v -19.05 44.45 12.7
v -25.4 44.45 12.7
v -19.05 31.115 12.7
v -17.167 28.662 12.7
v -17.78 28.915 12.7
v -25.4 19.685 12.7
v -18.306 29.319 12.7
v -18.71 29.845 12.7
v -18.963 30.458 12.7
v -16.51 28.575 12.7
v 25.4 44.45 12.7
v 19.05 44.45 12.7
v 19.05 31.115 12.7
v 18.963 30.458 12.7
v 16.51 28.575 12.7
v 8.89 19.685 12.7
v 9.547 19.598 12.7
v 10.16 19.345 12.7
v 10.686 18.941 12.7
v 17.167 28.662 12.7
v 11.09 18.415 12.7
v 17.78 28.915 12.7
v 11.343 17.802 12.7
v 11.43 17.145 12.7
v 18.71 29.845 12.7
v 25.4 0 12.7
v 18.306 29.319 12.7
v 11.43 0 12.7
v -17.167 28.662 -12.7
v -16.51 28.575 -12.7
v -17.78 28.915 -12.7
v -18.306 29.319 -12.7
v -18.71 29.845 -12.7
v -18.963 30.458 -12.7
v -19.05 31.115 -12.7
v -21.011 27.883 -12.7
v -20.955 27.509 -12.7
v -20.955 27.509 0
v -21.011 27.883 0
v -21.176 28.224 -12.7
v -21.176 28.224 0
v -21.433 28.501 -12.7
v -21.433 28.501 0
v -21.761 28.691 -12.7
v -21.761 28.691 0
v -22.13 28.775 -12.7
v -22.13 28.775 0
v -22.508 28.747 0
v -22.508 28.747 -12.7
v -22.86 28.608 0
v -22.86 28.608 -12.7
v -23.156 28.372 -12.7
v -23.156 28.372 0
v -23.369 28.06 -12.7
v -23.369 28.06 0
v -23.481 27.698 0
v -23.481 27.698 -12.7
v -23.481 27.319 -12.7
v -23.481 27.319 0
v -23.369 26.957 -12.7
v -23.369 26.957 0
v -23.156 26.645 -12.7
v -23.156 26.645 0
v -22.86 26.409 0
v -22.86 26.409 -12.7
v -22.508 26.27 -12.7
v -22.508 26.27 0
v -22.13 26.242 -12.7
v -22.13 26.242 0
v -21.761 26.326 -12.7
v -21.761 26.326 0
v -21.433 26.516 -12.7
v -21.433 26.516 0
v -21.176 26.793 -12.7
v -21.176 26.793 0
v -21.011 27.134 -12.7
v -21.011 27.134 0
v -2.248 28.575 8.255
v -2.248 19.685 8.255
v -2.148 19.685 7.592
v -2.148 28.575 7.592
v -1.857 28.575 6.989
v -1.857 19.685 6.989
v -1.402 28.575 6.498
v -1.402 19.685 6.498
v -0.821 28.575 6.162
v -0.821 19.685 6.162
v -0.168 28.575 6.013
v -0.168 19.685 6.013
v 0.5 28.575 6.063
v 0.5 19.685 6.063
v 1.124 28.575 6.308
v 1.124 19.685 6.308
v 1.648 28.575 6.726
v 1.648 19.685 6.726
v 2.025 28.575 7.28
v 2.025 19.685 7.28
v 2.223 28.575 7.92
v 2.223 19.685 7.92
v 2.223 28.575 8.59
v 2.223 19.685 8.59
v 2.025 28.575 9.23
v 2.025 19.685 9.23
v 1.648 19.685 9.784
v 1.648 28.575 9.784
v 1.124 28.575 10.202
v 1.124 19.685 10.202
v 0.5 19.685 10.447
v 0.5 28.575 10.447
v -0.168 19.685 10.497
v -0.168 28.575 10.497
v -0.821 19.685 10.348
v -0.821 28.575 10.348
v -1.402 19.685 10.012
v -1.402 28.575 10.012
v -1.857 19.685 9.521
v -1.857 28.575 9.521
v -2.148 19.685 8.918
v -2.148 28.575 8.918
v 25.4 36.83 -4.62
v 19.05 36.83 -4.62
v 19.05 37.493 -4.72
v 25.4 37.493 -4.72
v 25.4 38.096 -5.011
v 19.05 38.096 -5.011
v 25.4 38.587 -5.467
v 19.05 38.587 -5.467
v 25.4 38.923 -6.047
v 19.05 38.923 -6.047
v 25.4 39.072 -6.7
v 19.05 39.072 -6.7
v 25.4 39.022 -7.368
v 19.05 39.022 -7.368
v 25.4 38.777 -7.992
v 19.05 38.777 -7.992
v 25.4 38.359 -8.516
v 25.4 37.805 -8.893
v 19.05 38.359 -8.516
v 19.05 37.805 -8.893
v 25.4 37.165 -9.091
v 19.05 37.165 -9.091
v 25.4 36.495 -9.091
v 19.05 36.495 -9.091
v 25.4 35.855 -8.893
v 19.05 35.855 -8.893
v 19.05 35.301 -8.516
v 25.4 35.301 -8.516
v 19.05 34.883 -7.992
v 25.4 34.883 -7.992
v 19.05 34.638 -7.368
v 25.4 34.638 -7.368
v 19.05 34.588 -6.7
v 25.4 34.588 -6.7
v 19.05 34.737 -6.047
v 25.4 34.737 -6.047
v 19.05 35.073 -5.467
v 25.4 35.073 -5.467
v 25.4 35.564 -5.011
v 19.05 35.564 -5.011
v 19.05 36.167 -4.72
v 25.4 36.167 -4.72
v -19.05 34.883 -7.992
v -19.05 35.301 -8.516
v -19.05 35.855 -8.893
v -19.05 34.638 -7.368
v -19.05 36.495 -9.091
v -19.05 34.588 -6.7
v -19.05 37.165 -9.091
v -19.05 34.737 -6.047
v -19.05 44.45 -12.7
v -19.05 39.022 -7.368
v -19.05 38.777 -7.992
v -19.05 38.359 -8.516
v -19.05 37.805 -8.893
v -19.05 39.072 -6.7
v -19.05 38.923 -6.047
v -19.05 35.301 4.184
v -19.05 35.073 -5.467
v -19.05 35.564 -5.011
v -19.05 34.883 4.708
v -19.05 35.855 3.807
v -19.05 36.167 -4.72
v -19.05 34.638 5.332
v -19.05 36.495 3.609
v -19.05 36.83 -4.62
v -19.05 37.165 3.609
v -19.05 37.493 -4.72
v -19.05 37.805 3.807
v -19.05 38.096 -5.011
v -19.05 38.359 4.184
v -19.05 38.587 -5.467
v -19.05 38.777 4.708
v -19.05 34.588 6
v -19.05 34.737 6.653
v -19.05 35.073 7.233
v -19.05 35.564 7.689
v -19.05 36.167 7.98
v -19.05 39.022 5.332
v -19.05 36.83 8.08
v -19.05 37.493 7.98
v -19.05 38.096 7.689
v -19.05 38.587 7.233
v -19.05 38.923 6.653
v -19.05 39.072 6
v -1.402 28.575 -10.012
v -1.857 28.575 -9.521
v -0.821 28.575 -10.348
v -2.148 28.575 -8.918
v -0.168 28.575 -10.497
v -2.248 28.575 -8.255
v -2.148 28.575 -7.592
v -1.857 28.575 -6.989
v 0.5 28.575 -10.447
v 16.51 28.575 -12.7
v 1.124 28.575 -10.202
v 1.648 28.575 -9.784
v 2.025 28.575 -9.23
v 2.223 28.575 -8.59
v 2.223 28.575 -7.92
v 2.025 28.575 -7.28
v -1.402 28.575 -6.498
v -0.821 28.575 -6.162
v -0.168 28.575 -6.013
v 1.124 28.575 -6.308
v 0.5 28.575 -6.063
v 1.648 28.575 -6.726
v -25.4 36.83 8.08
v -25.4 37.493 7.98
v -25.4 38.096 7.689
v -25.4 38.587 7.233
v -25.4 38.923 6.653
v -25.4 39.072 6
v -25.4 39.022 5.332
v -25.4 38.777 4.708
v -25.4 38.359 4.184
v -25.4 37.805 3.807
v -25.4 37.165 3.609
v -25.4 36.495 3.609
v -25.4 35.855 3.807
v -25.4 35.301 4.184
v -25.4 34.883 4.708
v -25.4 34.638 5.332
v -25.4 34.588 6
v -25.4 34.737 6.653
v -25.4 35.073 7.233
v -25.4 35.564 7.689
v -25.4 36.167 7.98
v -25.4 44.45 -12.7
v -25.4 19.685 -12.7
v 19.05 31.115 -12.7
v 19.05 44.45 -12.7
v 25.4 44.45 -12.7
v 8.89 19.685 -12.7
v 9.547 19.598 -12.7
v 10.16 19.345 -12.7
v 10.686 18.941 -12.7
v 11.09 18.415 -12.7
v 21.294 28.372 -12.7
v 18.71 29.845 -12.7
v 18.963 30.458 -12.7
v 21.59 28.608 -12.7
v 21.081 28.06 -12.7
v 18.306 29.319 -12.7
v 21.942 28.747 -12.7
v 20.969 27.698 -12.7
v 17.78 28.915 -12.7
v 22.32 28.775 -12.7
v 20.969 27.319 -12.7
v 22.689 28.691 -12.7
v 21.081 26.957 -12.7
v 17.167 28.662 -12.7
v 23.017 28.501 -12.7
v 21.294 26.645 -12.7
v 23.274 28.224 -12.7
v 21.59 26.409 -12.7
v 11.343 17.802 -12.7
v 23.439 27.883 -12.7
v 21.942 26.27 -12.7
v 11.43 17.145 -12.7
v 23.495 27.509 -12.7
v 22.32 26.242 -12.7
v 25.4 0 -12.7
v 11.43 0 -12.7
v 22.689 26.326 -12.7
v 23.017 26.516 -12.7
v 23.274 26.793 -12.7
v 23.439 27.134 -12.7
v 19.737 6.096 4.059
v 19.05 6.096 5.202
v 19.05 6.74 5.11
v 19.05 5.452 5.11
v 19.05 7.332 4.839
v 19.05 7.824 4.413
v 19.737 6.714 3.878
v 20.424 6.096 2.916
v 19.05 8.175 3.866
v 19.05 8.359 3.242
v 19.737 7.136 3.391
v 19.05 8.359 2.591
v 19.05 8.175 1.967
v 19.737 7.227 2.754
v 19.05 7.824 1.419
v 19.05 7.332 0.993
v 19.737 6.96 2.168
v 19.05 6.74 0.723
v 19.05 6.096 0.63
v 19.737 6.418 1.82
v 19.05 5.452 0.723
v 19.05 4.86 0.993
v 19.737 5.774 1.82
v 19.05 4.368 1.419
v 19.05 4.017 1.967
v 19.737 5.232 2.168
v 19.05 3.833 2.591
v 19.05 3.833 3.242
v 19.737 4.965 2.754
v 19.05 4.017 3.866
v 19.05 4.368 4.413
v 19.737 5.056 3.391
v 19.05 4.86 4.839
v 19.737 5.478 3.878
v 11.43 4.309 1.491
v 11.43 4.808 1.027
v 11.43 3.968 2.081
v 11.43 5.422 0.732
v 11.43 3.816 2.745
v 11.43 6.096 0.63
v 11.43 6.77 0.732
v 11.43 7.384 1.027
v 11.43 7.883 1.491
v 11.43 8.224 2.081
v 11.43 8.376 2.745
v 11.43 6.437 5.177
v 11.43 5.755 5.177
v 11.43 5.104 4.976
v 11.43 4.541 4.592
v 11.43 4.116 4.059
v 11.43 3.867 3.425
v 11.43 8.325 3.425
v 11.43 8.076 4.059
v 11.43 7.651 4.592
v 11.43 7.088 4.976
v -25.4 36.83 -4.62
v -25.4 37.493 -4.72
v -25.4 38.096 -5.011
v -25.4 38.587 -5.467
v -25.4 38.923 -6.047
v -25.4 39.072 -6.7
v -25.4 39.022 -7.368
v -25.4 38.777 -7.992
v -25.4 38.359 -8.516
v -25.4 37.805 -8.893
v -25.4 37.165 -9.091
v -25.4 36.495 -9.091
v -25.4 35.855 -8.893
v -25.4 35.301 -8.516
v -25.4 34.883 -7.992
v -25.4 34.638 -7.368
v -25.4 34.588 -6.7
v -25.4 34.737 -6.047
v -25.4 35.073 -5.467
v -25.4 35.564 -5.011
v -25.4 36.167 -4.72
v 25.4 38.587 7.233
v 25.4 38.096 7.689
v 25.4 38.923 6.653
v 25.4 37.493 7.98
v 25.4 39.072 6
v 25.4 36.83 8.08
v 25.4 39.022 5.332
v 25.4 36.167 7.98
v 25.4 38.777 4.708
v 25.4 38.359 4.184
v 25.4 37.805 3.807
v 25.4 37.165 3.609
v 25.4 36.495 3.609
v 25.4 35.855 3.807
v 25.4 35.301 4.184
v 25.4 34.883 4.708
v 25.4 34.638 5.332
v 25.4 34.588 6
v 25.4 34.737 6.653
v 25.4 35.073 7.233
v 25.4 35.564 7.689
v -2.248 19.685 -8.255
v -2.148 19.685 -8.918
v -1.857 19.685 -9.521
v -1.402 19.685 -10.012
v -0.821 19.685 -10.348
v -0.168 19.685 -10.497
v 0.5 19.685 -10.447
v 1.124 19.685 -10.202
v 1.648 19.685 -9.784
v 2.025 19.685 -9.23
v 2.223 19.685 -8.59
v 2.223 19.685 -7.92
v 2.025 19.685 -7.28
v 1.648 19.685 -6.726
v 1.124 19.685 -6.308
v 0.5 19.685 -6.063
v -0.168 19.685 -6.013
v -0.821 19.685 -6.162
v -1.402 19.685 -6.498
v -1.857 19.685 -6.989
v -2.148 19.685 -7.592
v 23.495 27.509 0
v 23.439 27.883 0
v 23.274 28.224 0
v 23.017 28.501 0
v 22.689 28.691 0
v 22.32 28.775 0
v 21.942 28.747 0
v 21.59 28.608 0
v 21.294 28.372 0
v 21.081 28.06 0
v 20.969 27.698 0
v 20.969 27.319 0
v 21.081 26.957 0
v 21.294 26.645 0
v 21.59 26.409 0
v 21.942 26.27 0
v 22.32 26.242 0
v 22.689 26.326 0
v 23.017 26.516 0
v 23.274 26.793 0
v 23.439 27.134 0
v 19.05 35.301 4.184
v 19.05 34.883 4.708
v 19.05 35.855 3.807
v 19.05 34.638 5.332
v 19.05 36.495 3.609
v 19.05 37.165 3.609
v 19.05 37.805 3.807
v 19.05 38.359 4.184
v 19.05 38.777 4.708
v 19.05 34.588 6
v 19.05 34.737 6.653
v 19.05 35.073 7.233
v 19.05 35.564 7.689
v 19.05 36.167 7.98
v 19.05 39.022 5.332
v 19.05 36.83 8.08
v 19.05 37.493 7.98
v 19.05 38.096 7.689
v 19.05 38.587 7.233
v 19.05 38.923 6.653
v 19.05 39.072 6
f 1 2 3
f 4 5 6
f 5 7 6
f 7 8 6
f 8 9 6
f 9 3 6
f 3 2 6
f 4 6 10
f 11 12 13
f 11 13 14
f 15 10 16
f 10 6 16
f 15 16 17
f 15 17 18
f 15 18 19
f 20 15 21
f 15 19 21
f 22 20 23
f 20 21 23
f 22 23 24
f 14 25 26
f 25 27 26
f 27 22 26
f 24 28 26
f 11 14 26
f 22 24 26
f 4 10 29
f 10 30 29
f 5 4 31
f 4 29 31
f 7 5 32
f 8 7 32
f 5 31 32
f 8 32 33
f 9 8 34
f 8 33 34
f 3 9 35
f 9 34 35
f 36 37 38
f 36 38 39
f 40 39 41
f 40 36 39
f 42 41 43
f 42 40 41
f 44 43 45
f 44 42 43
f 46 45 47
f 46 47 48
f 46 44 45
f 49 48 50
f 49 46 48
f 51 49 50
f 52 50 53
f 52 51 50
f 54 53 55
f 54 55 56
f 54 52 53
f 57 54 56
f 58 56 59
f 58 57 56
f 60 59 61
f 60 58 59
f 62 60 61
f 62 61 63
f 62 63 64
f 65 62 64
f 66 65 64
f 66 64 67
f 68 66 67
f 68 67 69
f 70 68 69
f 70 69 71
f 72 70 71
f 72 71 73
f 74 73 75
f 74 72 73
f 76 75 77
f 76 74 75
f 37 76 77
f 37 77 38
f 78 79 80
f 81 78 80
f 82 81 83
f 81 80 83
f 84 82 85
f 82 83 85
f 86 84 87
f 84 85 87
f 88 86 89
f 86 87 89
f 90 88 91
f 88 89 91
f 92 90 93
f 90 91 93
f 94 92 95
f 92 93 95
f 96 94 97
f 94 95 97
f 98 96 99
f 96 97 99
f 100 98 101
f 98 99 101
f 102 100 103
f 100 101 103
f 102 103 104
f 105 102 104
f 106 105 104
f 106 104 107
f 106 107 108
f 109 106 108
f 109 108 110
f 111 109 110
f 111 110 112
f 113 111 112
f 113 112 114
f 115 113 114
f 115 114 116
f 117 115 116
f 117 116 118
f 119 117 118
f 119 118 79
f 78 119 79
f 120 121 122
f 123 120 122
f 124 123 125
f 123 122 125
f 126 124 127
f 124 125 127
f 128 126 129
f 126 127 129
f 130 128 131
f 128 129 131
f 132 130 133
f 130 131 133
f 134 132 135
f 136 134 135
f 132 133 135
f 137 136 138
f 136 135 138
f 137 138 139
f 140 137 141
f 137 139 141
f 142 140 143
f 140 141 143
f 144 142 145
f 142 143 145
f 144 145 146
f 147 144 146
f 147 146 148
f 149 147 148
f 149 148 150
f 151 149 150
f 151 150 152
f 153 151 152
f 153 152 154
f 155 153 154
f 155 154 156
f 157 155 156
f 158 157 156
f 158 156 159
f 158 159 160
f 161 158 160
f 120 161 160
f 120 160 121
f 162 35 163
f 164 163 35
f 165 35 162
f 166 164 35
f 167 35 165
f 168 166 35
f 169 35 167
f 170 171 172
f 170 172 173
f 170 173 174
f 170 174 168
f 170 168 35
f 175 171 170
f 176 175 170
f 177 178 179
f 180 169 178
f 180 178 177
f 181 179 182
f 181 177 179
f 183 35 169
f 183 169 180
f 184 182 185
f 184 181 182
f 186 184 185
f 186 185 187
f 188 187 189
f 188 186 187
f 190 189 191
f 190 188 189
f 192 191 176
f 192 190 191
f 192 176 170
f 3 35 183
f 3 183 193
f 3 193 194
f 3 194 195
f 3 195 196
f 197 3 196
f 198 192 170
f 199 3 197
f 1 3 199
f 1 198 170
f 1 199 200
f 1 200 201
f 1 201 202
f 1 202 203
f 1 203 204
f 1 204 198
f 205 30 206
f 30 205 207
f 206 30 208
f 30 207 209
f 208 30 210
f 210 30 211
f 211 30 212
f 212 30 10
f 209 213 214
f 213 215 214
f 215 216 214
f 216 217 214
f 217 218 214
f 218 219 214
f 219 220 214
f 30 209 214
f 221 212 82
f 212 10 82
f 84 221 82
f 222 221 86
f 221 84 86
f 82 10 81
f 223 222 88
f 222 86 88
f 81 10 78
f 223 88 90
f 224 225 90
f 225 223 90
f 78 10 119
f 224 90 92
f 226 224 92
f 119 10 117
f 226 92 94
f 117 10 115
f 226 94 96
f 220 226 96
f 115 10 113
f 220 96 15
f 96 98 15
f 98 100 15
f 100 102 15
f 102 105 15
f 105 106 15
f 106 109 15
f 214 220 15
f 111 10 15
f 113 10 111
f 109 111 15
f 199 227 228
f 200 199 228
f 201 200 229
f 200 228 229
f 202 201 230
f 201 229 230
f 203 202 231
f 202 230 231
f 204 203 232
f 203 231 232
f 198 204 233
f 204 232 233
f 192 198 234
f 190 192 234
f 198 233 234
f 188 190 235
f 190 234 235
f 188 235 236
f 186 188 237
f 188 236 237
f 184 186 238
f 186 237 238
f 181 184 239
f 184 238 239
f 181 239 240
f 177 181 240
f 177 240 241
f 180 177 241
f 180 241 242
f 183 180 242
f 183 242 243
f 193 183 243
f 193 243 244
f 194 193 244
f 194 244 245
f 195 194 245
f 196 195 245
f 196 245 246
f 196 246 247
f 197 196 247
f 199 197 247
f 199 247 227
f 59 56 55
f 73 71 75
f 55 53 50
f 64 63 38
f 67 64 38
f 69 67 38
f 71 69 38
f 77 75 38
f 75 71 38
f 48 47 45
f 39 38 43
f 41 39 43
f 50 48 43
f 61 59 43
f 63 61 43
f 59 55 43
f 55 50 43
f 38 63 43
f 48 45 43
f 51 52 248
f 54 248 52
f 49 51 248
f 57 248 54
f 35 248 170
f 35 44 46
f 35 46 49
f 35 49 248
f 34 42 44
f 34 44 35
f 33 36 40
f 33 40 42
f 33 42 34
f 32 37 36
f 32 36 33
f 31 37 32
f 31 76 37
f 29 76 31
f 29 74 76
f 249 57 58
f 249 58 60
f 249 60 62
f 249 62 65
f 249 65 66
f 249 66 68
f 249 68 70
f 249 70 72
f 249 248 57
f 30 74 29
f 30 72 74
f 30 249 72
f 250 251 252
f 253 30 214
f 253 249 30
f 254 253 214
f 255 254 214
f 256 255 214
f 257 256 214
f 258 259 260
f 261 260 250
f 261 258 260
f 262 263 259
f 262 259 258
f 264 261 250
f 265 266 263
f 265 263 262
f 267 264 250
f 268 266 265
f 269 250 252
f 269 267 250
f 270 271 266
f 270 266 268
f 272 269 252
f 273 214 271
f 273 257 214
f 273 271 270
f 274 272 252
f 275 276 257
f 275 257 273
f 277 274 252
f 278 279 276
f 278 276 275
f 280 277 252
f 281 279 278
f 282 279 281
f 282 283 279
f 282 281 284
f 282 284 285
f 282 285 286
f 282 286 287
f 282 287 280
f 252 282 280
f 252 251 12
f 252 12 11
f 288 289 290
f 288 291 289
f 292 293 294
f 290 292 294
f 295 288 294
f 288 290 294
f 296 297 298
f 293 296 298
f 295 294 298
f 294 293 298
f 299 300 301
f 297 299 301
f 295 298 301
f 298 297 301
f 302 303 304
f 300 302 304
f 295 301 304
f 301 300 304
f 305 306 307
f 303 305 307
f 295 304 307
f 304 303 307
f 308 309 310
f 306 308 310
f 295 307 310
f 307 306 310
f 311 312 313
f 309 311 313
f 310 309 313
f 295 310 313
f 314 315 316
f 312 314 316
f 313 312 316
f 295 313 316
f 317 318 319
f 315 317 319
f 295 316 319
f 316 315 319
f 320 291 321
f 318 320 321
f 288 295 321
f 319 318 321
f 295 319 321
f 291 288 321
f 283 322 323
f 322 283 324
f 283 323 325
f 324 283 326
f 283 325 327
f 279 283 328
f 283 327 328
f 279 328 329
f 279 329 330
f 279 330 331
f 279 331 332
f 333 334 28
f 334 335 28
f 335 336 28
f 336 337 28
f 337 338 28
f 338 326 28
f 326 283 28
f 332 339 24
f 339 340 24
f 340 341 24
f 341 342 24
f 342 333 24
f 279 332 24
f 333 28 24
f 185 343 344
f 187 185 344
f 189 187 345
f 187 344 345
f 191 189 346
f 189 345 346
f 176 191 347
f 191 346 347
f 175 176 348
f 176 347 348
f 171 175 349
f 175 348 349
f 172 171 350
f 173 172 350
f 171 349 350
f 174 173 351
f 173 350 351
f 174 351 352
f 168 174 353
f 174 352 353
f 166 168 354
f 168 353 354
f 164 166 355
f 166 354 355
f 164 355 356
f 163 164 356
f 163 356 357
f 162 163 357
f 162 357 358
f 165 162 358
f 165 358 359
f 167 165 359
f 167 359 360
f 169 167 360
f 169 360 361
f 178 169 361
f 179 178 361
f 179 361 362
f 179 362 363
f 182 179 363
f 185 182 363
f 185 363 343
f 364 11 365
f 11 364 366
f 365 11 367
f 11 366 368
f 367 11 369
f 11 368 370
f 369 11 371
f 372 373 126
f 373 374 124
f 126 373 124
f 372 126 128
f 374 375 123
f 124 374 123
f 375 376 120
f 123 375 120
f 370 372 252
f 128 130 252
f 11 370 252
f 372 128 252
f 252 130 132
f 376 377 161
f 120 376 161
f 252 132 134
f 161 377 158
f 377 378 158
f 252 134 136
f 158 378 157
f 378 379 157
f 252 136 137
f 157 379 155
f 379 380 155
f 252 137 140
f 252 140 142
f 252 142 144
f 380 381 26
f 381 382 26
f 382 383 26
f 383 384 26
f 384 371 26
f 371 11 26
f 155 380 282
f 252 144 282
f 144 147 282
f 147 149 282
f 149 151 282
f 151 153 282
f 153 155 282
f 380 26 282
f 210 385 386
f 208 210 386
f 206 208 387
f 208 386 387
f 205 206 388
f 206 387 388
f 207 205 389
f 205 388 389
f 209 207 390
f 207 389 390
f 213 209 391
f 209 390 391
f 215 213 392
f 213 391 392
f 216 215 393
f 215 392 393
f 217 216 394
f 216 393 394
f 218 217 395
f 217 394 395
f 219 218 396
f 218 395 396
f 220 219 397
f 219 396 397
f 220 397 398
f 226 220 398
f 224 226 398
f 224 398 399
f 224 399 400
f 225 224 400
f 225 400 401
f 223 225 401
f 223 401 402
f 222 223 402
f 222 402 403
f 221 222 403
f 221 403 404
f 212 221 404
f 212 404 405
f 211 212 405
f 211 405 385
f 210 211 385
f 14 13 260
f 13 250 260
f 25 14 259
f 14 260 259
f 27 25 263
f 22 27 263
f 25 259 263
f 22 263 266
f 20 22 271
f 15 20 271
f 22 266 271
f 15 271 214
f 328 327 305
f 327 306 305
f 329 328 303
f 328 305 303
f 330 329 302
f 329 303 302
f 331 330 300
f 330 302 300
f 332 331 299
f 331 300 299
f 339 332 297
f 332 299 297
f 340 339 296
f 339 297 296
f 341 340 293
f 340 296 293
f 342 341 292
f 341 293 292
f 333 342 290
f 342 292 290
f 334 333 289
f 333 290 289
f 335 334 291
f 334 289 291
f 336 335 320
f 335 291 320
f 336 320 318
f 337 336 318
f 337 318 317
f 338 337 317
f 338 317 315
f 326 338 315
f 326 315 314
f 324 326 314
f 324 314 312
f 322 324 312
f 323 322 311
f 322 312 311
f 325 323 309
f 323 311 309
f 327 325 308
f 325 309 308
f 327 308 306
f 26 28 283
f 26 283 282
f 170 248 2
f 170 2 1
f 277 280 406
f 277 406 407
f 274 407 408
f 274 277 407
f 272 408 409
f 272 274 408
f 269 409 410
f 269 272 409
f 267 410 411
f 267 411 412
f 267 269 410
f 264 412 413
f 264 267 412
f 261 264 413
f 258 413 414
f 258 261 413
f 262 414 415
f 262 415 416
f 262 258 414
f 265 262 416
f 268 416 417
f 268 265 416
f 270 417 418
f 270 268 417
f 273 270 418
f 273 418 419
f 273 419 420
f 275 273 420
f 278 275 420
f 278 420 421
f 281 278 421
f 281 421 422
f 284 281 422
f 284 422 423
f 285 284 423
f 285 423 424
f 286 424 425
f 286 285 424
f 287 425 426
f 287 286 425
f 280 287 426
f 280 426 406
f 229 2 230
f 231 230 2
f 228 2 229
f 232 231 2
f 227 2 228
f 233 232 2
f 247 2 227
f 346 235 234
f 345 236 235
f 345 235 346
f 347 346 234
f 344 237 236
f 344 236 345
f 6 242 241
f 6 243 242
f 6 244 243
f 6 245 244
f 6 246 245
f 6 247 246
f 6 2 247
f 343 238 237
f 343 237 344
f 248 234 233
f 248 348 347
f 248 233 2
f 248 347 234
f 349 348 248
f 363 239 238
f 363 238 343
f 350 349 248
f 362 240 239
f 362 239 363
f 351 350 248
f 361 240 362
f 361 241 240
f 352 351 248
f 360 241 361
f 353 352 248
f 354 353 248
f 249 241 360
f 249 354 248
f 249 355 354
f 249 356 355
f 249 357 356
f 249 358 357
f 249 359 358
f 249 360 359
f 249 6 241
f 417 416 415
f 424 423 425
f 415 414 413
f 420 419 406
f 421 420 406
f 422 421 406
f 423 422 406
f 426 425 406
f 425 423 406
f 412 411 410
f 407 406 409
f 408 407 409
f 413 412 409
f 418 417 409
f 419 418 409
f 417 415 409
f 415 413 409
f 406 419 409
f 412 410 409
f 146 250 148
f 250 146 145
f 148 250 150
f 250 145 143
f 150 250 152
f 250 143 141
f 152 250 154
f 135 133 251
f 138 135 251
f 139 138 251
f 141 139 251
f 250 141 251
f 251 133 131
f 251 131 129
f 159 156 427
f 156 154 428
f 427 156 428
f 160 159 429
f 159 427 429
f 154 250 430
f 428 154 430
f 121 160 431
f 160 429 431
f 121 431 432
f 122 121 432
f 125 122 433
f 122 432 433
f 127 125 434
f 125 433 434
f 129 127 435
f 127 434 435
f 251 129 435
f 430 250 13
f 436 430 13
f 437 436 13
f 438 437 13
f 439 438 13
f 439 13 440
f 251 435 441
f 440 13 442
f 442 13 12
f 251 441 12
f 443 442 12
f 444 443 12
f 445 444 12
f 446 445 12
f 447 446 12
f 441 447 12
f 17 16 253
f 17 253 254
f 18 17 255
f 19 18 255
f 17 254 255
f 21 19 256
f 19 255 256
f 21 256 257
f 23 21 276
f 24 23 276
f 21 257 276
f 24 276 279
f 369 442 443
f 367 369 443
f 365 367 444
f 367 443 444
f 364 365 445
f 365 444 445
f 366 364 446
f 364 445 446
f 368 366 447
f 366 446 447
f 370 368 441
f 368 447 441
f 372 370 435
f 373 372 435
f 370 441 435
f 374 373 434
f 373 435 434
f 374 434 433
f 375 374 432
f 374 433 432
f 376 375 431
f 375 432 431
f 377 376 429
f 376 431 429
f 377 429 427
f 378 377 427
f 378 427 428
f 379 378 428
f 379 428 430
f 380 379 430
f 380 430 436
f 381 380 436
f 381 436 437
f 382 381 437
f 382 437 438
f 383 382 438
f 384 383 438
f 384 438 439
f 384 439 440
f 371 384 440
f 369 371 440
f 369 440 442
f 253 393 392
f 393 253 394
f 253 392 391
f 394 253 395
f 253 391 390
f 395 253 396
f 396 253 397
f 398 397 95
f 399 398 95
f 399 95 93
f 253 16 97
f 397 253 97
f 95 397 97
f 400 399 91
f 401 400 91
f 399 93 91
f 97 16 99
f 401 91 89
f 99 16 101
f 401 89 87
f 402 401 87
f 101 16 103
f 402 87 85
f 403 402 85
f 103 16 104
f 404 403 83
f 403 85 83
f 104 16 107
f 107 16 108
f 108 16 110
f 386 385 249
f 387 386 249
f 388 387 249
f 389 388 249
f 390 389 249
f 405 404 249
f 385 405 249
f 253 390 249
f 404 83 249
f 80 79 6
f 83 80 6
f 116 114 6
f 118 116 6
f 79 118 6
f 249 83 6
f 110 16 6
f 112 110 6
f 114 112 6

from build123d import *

# Parameters (mm, degrees)
SKETCH1_W                    = 50.8
SKETCH1_H                    = 25.4
BOSS_EXTRUDE1_DEPTH          = 44.45
SKETCH8_W                    = 13.97
SKETCH8_H                    = 19.685
SKETCH8_W_2                  = 22.86
SKETCH8_W_3                  = 38.1
SKETCH8_H_2                  = 15.875
CUT_EXTRUDE1_DEPTH           = 58.15
F_8_CLEARANCE_HOLE3_D        = 4.4958
F_8_CLEARANCE_HOLE2_D        = 4.4958
F_1_8_0_18_DOWEL_HOLE1_D     = 4.572
F_1_8_0_18_DOWEL_HOLE1_DEPTH = 7.62
F_1_8_0_18_DOWEL_HOLE1_TIP   = 1.373567375
FILLET1_R                    = 2.54
SKETCH17_R                   = 1.27
CUT_EXTRUDE3_DEPTH           = 12.7


with BuildPart() as part:
    # Sketch1 → Boss-Extrude1 (new body)
    with BuildSketch(Plane(origin=(0, 0, 0), x_dir=(1, 0, 0), z_dir=(0, 1, 0))):
        Rectangle(SKETCH1_W, SKETCH1_H)
    extrude(amount=BOSS_EXTRUDE1_DEPTH)

    # Sketch8 → Cut-Extrude1 (cut, through all)
    with BuildSketch(Plane.XY.offset(12.7)):
        with Locations((-18.415, 9.8425)):
            Rectangle(SKETCH8_W, SKETCH8_H)
        with Locations((0, 9.8425)):
            Rectangle(SKETCH8_W_2, SKETCH8_H)
        with Locations((0, 36.5125)):
            Rectangle(SKETCH8_W_3, SKETCH8_H_2)
    extrude(amount=-CUT_EXTRUDE1_DEPTH, mode=Mode.SUBTRACT)

    # #8 Clearance Hole3 (through all)
    with Locations(Plane(origin=(25.4, 0, 0), x_dir=(0, 0, -1), z_dir=(1, 0, 0))):
        with Locations((6.868185943, 36.83), (-5.831814057, 36.83)):
            Hole(F_8_CLEARANCE_HOLE3_D / 2)

    # #8 Clearance Hole2 (through all)
    with Locations(Plane(origin=(0, 28.575, 0), x_dir=(1, 0, 0), z_dir=(0, 1, 0))):
        with Locations((0, 8.255), (0, -8.255)):
            Hole(F_8_CLEARANCE_HOLE2_D / 2)

    # 1/8 (0.18) Dowel Hole1
    with Locations(Plane.ZY.offset(-11.43)):
        with Locations((2.916276039, 6.096)):
            Hole(F_1_8_0_18_DOWEL_HOLE1_D / 2, depth=F_1_8_0_18_DOWEL_HOLE1_DEPTH)
            with Locations((0, 0, -(F_1_8_0_18_DOWEL_HOLE1_DEPTH + F_1_8_0_18_DOWEL_HOLE1_TIP / 2))):  # 118° drill point
                Cone(0, F_1_8_0_18_DOWEL_HOLE1_D / 2, F_1_8_0_18_DOWEL_HOLE1_TIP, mode=Mode.SUBTRACT)

    # Fillet1
    fillet1_edges = [part.edges().sort_by_distance(p)[0] for p in [
        (11.43, 19.685, 0),
        (19.05, 28.575, 0),
        (-19.05, 28.575, 0),
    ]]
    fillet(fillet1_edges, radius=FILLET1_R)

    # Sketch17 → Cut-Extrude3 (cut)
    with BuildSketch(Plane.XY.offset(-12.7)):
        with Locations((-22.225, 27.508501284)):
            Circle(SKETCH17_R)
        with Locations((22.225, 27.508501284)):
            Circle(SKETCH17_R)
    extrude(amount=CUT_EXTRUDE3_DEPTH, mode=Mode.SUBTRACT)


solid = part.part
